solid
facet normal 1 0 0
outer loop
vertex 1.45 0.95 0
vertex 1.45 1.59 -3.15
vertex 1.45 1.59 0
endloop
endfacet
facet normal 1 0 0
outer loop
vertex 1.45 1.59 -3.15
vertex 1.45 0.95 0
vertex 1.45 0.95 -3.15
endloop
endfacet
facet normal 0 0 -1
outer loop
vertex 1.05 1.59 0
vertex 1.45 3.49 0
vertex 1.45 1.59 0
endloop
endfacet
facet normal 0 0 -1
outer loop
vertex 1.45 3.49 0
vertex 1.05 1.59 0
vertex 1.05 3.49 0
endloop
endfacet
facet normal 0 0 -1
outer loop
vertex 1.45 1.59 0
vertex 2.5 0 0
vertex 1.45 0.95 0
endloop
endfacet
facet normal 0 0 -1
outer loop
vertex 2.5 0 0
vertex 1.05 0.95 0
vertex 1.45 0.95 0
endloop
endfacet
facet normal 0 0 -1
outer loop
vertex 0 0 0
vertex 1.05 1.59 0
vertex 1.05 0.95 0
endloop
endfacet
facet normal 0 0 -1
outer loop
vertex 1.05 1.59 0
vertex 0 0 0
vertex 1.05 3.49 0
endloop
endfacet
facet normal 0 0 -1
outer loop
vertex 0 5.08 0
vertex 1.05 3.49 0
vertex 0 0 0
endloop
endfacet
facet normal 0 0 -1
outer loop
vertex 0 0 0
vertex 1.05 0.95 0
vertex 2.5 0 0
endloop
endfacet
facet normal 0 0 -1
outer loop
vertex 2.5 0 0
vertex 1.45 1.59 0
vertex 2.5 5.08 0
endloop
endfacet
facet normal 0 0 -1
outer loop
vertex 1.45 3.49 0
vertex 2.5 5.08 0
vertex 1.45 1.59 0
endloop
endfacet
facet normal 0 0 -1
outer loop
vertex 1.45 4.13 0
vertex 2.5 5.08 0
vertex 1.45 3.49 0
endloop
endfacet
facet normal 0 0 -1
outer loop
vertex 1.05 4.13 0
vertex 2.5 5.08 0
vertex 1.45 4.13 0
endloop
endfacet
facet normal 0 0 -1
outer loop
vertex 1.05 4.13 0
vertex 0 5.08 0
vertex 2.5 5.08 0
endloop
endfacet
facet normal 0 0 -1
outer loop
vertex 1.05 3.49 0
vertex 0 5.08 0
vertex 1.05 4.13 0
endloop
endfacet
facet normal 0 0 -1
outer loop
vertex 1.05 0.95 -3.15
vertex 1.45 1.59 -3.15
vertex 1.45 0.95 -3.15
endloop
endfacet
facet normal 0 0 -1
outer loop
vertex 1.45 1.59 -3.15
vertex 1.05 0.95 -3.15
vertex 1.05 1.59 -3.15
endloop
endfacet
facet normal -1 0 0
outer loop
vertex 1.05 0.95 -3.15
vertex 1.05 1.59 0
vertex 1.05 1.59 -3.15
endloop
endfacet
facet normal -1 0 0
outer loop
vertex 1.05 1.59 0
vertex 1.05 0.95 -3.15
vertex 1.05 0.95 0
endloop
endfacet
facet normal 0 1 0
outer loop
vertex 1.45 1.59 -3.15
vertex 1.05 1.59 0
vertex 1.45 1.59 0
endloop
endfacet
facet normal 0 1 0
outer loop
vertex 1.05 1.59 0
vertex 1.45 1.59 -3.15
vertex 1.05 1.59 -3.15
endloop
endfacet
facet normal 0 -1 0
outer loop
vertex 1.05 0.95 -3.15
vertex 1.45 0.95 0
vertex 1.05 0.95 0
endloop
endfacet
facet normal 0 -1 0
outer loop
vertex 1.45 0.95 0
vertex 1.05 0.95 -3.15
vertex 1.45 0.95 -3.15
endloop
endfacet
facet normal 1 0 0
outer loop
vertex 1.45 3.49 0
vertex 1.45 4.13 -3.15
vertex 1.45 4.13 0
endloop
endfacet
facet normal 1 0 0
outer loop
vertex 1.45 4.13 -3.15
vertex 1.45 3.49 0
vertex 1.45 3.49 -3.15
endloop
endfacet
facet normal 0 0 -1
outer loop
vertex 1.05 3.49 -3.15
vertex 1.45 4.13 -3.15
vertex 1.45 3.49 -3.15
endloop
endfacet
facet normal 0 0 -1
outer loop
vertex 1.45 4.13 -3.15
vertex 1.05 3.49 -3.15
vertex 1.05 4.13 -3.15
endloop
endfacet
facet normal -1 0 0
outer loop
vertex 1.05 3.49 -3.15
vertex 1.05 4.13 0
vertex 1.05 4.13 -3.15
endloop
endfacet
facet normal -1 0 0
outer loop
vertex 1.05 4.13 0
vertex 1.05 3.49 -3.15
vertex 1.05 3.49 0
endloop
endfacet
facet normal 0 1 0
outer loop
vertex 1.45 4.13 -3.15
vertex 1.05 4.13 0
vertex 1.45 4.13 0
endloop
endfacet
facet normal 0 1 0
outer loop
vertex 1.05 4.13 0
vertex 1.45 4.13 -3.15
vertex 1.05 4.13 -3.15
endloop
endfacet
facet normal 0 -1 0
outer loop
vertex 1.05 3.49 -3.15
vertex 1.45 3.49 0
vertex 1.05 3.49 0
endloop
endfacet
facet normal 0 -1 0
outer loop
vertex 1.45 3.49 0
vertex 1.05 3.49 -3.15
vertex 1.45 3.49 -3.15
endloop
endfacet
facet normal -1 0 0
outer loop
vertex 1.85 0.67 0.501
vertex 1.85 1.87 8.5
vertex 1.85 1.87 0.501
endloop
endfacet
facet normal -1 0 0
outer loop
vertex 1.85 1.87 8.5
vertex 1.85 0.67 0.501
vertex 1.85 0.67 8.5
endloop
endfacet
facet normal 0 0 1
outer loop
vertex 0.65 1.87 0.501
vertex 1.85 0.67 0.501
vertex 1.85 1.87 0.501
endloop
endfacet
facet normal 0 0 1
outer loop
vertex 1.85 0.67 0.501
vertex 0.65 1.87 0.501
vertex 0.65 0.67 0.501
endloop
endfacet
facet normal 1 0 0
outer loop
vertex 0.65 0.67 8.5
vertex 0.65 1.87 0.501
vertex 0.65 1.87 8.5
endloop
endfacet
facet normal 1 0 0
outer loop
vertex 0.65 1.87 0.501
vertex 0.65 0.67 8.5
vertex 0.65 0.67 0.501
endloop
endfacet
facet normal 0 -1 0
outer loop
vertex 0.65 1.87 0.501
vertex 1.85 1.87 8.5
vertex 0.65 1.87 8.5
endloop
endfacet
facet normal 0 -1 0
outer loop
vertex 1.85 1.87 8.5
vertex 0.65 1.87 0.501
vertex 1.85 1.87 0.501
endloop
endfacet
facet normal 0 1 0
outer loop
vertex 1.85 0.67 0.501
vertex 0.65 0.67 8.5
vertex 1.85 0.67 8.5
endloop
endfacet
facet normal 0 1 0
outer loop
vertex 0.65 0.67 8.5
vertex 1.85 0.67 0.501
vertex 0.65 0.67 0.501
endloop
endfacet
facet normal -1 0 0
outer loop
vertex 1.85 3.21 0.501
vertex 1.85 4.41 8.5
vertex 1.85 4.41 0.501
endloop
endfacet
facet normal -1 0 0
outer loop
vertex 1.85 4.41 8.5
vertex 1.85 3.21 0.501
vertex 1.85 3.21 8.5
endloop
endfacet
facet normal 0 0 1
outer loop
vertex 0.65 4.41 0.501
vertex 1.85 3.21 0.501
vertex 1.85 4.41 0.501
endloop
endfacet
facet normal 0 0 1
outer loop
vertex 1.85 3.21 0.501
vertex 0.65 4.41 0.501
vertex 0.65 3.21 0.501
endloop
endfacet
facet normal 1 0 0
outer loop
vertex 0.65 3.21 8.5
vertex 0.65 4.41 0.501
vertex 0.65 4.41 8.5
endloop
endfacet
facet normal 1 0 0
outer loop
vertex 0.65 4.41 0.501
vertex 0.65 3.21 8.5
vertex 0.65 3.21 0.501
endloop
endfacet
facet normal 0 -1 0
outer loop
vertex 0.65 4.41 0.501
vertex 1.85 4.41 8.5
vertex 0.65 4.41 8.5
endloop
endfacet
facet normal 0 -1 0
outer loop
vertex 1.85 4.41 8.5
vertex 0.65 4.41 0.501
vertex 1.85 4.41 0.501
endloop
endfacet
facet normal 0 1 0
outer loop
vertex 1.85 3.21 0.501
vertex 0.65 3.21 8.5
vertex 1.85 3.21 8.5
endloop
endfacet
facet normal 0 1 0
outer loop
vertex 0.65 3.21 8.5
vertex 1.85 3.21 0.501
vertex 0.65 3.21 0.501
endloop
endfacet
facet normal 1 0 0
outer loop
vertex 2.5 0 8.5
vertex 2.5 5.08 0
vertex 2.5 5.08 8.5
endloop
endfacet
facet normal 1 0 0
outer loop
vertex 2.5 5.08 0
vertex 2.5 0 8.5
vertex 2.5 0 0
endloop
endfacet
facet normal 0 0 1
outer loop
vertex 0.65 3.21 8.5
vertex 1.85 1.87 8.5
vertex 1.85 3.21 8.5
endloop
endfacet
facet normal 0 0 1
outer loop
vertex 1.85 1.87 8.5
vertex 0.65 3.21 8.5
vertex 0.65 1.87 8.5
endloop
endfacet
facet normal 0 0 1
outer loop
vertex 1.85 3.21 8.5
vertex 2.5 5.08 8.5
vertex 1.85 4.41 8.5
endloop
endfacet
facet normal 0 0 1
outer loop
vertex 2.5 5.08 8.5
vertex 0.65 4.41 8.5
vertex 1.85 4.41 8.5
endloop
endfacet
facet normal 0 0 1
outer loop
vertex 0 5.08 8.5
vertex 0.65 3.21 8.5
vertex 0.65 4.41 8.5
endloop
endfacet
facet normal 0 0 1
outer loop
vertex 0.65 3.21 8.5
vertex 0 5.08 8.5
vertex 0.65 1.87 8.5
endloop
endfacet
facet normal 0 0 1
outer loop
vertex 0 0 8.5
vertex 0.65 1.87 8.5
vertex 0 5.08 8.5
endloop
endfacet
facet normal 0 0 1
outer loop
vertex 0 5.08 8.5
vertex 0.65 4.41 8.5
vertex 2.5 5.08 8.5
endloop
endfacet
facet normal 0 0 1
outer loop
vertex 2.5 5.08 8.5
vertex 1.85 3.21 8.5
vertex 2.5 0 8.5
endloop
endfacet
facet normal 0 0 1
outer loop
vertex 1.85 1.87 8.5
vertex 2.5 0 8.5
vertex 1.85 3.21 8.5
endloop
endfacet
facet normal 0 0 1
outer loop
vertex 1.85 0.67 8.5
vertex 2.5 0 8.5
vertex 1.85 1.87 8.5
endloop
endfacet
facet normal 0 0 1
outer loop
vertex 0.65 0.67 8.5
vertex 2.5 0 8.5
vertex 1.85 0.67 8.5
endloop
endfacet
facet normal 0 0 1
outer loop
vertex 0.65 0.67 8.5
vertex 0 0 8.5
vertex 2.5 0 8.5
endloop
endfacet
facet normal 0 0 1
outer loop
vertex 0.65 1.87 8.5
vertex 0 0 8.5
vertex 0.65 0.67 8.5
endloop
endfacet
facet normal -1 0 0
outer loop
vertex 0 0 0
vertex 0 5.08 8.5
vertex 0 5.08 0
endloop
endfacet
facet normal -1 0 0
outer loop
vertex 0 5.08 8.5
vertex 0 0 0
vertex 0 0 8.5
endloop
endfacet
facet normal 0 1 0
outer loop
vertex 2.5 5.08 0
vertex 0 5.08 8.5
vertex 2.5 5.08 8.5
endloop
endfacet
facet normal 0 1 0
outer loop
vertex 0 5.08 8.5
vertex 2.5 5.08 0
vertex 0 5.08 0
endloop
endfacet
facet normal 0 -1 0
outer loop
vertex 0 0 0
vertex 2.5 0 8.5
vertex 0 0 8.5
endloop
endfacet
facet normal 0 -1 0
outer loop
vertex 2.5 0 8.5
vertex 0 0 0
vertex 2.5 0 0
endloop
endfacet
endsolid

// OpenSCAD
epsilon = .001;

module pinSocket(num_pins=2) {

    for (i = [0:num_pins-1]) {
        translate([2.5/2, 2.54/2+2.54*i, -3.15/2])
        cube([.4, .64, 3.15], center=true);
    }

    difference() {
        cube([2.5, 2.54*num_pins, 8.5]);

        for (i = [0:num_pins-1]) {
            translate([2.5/2, 2.54/2+2.54*i, 8.5-4+epsilon])
            cube([1.2, 1.2, 8], center=true);
        }

    }
}

pinSocket();
